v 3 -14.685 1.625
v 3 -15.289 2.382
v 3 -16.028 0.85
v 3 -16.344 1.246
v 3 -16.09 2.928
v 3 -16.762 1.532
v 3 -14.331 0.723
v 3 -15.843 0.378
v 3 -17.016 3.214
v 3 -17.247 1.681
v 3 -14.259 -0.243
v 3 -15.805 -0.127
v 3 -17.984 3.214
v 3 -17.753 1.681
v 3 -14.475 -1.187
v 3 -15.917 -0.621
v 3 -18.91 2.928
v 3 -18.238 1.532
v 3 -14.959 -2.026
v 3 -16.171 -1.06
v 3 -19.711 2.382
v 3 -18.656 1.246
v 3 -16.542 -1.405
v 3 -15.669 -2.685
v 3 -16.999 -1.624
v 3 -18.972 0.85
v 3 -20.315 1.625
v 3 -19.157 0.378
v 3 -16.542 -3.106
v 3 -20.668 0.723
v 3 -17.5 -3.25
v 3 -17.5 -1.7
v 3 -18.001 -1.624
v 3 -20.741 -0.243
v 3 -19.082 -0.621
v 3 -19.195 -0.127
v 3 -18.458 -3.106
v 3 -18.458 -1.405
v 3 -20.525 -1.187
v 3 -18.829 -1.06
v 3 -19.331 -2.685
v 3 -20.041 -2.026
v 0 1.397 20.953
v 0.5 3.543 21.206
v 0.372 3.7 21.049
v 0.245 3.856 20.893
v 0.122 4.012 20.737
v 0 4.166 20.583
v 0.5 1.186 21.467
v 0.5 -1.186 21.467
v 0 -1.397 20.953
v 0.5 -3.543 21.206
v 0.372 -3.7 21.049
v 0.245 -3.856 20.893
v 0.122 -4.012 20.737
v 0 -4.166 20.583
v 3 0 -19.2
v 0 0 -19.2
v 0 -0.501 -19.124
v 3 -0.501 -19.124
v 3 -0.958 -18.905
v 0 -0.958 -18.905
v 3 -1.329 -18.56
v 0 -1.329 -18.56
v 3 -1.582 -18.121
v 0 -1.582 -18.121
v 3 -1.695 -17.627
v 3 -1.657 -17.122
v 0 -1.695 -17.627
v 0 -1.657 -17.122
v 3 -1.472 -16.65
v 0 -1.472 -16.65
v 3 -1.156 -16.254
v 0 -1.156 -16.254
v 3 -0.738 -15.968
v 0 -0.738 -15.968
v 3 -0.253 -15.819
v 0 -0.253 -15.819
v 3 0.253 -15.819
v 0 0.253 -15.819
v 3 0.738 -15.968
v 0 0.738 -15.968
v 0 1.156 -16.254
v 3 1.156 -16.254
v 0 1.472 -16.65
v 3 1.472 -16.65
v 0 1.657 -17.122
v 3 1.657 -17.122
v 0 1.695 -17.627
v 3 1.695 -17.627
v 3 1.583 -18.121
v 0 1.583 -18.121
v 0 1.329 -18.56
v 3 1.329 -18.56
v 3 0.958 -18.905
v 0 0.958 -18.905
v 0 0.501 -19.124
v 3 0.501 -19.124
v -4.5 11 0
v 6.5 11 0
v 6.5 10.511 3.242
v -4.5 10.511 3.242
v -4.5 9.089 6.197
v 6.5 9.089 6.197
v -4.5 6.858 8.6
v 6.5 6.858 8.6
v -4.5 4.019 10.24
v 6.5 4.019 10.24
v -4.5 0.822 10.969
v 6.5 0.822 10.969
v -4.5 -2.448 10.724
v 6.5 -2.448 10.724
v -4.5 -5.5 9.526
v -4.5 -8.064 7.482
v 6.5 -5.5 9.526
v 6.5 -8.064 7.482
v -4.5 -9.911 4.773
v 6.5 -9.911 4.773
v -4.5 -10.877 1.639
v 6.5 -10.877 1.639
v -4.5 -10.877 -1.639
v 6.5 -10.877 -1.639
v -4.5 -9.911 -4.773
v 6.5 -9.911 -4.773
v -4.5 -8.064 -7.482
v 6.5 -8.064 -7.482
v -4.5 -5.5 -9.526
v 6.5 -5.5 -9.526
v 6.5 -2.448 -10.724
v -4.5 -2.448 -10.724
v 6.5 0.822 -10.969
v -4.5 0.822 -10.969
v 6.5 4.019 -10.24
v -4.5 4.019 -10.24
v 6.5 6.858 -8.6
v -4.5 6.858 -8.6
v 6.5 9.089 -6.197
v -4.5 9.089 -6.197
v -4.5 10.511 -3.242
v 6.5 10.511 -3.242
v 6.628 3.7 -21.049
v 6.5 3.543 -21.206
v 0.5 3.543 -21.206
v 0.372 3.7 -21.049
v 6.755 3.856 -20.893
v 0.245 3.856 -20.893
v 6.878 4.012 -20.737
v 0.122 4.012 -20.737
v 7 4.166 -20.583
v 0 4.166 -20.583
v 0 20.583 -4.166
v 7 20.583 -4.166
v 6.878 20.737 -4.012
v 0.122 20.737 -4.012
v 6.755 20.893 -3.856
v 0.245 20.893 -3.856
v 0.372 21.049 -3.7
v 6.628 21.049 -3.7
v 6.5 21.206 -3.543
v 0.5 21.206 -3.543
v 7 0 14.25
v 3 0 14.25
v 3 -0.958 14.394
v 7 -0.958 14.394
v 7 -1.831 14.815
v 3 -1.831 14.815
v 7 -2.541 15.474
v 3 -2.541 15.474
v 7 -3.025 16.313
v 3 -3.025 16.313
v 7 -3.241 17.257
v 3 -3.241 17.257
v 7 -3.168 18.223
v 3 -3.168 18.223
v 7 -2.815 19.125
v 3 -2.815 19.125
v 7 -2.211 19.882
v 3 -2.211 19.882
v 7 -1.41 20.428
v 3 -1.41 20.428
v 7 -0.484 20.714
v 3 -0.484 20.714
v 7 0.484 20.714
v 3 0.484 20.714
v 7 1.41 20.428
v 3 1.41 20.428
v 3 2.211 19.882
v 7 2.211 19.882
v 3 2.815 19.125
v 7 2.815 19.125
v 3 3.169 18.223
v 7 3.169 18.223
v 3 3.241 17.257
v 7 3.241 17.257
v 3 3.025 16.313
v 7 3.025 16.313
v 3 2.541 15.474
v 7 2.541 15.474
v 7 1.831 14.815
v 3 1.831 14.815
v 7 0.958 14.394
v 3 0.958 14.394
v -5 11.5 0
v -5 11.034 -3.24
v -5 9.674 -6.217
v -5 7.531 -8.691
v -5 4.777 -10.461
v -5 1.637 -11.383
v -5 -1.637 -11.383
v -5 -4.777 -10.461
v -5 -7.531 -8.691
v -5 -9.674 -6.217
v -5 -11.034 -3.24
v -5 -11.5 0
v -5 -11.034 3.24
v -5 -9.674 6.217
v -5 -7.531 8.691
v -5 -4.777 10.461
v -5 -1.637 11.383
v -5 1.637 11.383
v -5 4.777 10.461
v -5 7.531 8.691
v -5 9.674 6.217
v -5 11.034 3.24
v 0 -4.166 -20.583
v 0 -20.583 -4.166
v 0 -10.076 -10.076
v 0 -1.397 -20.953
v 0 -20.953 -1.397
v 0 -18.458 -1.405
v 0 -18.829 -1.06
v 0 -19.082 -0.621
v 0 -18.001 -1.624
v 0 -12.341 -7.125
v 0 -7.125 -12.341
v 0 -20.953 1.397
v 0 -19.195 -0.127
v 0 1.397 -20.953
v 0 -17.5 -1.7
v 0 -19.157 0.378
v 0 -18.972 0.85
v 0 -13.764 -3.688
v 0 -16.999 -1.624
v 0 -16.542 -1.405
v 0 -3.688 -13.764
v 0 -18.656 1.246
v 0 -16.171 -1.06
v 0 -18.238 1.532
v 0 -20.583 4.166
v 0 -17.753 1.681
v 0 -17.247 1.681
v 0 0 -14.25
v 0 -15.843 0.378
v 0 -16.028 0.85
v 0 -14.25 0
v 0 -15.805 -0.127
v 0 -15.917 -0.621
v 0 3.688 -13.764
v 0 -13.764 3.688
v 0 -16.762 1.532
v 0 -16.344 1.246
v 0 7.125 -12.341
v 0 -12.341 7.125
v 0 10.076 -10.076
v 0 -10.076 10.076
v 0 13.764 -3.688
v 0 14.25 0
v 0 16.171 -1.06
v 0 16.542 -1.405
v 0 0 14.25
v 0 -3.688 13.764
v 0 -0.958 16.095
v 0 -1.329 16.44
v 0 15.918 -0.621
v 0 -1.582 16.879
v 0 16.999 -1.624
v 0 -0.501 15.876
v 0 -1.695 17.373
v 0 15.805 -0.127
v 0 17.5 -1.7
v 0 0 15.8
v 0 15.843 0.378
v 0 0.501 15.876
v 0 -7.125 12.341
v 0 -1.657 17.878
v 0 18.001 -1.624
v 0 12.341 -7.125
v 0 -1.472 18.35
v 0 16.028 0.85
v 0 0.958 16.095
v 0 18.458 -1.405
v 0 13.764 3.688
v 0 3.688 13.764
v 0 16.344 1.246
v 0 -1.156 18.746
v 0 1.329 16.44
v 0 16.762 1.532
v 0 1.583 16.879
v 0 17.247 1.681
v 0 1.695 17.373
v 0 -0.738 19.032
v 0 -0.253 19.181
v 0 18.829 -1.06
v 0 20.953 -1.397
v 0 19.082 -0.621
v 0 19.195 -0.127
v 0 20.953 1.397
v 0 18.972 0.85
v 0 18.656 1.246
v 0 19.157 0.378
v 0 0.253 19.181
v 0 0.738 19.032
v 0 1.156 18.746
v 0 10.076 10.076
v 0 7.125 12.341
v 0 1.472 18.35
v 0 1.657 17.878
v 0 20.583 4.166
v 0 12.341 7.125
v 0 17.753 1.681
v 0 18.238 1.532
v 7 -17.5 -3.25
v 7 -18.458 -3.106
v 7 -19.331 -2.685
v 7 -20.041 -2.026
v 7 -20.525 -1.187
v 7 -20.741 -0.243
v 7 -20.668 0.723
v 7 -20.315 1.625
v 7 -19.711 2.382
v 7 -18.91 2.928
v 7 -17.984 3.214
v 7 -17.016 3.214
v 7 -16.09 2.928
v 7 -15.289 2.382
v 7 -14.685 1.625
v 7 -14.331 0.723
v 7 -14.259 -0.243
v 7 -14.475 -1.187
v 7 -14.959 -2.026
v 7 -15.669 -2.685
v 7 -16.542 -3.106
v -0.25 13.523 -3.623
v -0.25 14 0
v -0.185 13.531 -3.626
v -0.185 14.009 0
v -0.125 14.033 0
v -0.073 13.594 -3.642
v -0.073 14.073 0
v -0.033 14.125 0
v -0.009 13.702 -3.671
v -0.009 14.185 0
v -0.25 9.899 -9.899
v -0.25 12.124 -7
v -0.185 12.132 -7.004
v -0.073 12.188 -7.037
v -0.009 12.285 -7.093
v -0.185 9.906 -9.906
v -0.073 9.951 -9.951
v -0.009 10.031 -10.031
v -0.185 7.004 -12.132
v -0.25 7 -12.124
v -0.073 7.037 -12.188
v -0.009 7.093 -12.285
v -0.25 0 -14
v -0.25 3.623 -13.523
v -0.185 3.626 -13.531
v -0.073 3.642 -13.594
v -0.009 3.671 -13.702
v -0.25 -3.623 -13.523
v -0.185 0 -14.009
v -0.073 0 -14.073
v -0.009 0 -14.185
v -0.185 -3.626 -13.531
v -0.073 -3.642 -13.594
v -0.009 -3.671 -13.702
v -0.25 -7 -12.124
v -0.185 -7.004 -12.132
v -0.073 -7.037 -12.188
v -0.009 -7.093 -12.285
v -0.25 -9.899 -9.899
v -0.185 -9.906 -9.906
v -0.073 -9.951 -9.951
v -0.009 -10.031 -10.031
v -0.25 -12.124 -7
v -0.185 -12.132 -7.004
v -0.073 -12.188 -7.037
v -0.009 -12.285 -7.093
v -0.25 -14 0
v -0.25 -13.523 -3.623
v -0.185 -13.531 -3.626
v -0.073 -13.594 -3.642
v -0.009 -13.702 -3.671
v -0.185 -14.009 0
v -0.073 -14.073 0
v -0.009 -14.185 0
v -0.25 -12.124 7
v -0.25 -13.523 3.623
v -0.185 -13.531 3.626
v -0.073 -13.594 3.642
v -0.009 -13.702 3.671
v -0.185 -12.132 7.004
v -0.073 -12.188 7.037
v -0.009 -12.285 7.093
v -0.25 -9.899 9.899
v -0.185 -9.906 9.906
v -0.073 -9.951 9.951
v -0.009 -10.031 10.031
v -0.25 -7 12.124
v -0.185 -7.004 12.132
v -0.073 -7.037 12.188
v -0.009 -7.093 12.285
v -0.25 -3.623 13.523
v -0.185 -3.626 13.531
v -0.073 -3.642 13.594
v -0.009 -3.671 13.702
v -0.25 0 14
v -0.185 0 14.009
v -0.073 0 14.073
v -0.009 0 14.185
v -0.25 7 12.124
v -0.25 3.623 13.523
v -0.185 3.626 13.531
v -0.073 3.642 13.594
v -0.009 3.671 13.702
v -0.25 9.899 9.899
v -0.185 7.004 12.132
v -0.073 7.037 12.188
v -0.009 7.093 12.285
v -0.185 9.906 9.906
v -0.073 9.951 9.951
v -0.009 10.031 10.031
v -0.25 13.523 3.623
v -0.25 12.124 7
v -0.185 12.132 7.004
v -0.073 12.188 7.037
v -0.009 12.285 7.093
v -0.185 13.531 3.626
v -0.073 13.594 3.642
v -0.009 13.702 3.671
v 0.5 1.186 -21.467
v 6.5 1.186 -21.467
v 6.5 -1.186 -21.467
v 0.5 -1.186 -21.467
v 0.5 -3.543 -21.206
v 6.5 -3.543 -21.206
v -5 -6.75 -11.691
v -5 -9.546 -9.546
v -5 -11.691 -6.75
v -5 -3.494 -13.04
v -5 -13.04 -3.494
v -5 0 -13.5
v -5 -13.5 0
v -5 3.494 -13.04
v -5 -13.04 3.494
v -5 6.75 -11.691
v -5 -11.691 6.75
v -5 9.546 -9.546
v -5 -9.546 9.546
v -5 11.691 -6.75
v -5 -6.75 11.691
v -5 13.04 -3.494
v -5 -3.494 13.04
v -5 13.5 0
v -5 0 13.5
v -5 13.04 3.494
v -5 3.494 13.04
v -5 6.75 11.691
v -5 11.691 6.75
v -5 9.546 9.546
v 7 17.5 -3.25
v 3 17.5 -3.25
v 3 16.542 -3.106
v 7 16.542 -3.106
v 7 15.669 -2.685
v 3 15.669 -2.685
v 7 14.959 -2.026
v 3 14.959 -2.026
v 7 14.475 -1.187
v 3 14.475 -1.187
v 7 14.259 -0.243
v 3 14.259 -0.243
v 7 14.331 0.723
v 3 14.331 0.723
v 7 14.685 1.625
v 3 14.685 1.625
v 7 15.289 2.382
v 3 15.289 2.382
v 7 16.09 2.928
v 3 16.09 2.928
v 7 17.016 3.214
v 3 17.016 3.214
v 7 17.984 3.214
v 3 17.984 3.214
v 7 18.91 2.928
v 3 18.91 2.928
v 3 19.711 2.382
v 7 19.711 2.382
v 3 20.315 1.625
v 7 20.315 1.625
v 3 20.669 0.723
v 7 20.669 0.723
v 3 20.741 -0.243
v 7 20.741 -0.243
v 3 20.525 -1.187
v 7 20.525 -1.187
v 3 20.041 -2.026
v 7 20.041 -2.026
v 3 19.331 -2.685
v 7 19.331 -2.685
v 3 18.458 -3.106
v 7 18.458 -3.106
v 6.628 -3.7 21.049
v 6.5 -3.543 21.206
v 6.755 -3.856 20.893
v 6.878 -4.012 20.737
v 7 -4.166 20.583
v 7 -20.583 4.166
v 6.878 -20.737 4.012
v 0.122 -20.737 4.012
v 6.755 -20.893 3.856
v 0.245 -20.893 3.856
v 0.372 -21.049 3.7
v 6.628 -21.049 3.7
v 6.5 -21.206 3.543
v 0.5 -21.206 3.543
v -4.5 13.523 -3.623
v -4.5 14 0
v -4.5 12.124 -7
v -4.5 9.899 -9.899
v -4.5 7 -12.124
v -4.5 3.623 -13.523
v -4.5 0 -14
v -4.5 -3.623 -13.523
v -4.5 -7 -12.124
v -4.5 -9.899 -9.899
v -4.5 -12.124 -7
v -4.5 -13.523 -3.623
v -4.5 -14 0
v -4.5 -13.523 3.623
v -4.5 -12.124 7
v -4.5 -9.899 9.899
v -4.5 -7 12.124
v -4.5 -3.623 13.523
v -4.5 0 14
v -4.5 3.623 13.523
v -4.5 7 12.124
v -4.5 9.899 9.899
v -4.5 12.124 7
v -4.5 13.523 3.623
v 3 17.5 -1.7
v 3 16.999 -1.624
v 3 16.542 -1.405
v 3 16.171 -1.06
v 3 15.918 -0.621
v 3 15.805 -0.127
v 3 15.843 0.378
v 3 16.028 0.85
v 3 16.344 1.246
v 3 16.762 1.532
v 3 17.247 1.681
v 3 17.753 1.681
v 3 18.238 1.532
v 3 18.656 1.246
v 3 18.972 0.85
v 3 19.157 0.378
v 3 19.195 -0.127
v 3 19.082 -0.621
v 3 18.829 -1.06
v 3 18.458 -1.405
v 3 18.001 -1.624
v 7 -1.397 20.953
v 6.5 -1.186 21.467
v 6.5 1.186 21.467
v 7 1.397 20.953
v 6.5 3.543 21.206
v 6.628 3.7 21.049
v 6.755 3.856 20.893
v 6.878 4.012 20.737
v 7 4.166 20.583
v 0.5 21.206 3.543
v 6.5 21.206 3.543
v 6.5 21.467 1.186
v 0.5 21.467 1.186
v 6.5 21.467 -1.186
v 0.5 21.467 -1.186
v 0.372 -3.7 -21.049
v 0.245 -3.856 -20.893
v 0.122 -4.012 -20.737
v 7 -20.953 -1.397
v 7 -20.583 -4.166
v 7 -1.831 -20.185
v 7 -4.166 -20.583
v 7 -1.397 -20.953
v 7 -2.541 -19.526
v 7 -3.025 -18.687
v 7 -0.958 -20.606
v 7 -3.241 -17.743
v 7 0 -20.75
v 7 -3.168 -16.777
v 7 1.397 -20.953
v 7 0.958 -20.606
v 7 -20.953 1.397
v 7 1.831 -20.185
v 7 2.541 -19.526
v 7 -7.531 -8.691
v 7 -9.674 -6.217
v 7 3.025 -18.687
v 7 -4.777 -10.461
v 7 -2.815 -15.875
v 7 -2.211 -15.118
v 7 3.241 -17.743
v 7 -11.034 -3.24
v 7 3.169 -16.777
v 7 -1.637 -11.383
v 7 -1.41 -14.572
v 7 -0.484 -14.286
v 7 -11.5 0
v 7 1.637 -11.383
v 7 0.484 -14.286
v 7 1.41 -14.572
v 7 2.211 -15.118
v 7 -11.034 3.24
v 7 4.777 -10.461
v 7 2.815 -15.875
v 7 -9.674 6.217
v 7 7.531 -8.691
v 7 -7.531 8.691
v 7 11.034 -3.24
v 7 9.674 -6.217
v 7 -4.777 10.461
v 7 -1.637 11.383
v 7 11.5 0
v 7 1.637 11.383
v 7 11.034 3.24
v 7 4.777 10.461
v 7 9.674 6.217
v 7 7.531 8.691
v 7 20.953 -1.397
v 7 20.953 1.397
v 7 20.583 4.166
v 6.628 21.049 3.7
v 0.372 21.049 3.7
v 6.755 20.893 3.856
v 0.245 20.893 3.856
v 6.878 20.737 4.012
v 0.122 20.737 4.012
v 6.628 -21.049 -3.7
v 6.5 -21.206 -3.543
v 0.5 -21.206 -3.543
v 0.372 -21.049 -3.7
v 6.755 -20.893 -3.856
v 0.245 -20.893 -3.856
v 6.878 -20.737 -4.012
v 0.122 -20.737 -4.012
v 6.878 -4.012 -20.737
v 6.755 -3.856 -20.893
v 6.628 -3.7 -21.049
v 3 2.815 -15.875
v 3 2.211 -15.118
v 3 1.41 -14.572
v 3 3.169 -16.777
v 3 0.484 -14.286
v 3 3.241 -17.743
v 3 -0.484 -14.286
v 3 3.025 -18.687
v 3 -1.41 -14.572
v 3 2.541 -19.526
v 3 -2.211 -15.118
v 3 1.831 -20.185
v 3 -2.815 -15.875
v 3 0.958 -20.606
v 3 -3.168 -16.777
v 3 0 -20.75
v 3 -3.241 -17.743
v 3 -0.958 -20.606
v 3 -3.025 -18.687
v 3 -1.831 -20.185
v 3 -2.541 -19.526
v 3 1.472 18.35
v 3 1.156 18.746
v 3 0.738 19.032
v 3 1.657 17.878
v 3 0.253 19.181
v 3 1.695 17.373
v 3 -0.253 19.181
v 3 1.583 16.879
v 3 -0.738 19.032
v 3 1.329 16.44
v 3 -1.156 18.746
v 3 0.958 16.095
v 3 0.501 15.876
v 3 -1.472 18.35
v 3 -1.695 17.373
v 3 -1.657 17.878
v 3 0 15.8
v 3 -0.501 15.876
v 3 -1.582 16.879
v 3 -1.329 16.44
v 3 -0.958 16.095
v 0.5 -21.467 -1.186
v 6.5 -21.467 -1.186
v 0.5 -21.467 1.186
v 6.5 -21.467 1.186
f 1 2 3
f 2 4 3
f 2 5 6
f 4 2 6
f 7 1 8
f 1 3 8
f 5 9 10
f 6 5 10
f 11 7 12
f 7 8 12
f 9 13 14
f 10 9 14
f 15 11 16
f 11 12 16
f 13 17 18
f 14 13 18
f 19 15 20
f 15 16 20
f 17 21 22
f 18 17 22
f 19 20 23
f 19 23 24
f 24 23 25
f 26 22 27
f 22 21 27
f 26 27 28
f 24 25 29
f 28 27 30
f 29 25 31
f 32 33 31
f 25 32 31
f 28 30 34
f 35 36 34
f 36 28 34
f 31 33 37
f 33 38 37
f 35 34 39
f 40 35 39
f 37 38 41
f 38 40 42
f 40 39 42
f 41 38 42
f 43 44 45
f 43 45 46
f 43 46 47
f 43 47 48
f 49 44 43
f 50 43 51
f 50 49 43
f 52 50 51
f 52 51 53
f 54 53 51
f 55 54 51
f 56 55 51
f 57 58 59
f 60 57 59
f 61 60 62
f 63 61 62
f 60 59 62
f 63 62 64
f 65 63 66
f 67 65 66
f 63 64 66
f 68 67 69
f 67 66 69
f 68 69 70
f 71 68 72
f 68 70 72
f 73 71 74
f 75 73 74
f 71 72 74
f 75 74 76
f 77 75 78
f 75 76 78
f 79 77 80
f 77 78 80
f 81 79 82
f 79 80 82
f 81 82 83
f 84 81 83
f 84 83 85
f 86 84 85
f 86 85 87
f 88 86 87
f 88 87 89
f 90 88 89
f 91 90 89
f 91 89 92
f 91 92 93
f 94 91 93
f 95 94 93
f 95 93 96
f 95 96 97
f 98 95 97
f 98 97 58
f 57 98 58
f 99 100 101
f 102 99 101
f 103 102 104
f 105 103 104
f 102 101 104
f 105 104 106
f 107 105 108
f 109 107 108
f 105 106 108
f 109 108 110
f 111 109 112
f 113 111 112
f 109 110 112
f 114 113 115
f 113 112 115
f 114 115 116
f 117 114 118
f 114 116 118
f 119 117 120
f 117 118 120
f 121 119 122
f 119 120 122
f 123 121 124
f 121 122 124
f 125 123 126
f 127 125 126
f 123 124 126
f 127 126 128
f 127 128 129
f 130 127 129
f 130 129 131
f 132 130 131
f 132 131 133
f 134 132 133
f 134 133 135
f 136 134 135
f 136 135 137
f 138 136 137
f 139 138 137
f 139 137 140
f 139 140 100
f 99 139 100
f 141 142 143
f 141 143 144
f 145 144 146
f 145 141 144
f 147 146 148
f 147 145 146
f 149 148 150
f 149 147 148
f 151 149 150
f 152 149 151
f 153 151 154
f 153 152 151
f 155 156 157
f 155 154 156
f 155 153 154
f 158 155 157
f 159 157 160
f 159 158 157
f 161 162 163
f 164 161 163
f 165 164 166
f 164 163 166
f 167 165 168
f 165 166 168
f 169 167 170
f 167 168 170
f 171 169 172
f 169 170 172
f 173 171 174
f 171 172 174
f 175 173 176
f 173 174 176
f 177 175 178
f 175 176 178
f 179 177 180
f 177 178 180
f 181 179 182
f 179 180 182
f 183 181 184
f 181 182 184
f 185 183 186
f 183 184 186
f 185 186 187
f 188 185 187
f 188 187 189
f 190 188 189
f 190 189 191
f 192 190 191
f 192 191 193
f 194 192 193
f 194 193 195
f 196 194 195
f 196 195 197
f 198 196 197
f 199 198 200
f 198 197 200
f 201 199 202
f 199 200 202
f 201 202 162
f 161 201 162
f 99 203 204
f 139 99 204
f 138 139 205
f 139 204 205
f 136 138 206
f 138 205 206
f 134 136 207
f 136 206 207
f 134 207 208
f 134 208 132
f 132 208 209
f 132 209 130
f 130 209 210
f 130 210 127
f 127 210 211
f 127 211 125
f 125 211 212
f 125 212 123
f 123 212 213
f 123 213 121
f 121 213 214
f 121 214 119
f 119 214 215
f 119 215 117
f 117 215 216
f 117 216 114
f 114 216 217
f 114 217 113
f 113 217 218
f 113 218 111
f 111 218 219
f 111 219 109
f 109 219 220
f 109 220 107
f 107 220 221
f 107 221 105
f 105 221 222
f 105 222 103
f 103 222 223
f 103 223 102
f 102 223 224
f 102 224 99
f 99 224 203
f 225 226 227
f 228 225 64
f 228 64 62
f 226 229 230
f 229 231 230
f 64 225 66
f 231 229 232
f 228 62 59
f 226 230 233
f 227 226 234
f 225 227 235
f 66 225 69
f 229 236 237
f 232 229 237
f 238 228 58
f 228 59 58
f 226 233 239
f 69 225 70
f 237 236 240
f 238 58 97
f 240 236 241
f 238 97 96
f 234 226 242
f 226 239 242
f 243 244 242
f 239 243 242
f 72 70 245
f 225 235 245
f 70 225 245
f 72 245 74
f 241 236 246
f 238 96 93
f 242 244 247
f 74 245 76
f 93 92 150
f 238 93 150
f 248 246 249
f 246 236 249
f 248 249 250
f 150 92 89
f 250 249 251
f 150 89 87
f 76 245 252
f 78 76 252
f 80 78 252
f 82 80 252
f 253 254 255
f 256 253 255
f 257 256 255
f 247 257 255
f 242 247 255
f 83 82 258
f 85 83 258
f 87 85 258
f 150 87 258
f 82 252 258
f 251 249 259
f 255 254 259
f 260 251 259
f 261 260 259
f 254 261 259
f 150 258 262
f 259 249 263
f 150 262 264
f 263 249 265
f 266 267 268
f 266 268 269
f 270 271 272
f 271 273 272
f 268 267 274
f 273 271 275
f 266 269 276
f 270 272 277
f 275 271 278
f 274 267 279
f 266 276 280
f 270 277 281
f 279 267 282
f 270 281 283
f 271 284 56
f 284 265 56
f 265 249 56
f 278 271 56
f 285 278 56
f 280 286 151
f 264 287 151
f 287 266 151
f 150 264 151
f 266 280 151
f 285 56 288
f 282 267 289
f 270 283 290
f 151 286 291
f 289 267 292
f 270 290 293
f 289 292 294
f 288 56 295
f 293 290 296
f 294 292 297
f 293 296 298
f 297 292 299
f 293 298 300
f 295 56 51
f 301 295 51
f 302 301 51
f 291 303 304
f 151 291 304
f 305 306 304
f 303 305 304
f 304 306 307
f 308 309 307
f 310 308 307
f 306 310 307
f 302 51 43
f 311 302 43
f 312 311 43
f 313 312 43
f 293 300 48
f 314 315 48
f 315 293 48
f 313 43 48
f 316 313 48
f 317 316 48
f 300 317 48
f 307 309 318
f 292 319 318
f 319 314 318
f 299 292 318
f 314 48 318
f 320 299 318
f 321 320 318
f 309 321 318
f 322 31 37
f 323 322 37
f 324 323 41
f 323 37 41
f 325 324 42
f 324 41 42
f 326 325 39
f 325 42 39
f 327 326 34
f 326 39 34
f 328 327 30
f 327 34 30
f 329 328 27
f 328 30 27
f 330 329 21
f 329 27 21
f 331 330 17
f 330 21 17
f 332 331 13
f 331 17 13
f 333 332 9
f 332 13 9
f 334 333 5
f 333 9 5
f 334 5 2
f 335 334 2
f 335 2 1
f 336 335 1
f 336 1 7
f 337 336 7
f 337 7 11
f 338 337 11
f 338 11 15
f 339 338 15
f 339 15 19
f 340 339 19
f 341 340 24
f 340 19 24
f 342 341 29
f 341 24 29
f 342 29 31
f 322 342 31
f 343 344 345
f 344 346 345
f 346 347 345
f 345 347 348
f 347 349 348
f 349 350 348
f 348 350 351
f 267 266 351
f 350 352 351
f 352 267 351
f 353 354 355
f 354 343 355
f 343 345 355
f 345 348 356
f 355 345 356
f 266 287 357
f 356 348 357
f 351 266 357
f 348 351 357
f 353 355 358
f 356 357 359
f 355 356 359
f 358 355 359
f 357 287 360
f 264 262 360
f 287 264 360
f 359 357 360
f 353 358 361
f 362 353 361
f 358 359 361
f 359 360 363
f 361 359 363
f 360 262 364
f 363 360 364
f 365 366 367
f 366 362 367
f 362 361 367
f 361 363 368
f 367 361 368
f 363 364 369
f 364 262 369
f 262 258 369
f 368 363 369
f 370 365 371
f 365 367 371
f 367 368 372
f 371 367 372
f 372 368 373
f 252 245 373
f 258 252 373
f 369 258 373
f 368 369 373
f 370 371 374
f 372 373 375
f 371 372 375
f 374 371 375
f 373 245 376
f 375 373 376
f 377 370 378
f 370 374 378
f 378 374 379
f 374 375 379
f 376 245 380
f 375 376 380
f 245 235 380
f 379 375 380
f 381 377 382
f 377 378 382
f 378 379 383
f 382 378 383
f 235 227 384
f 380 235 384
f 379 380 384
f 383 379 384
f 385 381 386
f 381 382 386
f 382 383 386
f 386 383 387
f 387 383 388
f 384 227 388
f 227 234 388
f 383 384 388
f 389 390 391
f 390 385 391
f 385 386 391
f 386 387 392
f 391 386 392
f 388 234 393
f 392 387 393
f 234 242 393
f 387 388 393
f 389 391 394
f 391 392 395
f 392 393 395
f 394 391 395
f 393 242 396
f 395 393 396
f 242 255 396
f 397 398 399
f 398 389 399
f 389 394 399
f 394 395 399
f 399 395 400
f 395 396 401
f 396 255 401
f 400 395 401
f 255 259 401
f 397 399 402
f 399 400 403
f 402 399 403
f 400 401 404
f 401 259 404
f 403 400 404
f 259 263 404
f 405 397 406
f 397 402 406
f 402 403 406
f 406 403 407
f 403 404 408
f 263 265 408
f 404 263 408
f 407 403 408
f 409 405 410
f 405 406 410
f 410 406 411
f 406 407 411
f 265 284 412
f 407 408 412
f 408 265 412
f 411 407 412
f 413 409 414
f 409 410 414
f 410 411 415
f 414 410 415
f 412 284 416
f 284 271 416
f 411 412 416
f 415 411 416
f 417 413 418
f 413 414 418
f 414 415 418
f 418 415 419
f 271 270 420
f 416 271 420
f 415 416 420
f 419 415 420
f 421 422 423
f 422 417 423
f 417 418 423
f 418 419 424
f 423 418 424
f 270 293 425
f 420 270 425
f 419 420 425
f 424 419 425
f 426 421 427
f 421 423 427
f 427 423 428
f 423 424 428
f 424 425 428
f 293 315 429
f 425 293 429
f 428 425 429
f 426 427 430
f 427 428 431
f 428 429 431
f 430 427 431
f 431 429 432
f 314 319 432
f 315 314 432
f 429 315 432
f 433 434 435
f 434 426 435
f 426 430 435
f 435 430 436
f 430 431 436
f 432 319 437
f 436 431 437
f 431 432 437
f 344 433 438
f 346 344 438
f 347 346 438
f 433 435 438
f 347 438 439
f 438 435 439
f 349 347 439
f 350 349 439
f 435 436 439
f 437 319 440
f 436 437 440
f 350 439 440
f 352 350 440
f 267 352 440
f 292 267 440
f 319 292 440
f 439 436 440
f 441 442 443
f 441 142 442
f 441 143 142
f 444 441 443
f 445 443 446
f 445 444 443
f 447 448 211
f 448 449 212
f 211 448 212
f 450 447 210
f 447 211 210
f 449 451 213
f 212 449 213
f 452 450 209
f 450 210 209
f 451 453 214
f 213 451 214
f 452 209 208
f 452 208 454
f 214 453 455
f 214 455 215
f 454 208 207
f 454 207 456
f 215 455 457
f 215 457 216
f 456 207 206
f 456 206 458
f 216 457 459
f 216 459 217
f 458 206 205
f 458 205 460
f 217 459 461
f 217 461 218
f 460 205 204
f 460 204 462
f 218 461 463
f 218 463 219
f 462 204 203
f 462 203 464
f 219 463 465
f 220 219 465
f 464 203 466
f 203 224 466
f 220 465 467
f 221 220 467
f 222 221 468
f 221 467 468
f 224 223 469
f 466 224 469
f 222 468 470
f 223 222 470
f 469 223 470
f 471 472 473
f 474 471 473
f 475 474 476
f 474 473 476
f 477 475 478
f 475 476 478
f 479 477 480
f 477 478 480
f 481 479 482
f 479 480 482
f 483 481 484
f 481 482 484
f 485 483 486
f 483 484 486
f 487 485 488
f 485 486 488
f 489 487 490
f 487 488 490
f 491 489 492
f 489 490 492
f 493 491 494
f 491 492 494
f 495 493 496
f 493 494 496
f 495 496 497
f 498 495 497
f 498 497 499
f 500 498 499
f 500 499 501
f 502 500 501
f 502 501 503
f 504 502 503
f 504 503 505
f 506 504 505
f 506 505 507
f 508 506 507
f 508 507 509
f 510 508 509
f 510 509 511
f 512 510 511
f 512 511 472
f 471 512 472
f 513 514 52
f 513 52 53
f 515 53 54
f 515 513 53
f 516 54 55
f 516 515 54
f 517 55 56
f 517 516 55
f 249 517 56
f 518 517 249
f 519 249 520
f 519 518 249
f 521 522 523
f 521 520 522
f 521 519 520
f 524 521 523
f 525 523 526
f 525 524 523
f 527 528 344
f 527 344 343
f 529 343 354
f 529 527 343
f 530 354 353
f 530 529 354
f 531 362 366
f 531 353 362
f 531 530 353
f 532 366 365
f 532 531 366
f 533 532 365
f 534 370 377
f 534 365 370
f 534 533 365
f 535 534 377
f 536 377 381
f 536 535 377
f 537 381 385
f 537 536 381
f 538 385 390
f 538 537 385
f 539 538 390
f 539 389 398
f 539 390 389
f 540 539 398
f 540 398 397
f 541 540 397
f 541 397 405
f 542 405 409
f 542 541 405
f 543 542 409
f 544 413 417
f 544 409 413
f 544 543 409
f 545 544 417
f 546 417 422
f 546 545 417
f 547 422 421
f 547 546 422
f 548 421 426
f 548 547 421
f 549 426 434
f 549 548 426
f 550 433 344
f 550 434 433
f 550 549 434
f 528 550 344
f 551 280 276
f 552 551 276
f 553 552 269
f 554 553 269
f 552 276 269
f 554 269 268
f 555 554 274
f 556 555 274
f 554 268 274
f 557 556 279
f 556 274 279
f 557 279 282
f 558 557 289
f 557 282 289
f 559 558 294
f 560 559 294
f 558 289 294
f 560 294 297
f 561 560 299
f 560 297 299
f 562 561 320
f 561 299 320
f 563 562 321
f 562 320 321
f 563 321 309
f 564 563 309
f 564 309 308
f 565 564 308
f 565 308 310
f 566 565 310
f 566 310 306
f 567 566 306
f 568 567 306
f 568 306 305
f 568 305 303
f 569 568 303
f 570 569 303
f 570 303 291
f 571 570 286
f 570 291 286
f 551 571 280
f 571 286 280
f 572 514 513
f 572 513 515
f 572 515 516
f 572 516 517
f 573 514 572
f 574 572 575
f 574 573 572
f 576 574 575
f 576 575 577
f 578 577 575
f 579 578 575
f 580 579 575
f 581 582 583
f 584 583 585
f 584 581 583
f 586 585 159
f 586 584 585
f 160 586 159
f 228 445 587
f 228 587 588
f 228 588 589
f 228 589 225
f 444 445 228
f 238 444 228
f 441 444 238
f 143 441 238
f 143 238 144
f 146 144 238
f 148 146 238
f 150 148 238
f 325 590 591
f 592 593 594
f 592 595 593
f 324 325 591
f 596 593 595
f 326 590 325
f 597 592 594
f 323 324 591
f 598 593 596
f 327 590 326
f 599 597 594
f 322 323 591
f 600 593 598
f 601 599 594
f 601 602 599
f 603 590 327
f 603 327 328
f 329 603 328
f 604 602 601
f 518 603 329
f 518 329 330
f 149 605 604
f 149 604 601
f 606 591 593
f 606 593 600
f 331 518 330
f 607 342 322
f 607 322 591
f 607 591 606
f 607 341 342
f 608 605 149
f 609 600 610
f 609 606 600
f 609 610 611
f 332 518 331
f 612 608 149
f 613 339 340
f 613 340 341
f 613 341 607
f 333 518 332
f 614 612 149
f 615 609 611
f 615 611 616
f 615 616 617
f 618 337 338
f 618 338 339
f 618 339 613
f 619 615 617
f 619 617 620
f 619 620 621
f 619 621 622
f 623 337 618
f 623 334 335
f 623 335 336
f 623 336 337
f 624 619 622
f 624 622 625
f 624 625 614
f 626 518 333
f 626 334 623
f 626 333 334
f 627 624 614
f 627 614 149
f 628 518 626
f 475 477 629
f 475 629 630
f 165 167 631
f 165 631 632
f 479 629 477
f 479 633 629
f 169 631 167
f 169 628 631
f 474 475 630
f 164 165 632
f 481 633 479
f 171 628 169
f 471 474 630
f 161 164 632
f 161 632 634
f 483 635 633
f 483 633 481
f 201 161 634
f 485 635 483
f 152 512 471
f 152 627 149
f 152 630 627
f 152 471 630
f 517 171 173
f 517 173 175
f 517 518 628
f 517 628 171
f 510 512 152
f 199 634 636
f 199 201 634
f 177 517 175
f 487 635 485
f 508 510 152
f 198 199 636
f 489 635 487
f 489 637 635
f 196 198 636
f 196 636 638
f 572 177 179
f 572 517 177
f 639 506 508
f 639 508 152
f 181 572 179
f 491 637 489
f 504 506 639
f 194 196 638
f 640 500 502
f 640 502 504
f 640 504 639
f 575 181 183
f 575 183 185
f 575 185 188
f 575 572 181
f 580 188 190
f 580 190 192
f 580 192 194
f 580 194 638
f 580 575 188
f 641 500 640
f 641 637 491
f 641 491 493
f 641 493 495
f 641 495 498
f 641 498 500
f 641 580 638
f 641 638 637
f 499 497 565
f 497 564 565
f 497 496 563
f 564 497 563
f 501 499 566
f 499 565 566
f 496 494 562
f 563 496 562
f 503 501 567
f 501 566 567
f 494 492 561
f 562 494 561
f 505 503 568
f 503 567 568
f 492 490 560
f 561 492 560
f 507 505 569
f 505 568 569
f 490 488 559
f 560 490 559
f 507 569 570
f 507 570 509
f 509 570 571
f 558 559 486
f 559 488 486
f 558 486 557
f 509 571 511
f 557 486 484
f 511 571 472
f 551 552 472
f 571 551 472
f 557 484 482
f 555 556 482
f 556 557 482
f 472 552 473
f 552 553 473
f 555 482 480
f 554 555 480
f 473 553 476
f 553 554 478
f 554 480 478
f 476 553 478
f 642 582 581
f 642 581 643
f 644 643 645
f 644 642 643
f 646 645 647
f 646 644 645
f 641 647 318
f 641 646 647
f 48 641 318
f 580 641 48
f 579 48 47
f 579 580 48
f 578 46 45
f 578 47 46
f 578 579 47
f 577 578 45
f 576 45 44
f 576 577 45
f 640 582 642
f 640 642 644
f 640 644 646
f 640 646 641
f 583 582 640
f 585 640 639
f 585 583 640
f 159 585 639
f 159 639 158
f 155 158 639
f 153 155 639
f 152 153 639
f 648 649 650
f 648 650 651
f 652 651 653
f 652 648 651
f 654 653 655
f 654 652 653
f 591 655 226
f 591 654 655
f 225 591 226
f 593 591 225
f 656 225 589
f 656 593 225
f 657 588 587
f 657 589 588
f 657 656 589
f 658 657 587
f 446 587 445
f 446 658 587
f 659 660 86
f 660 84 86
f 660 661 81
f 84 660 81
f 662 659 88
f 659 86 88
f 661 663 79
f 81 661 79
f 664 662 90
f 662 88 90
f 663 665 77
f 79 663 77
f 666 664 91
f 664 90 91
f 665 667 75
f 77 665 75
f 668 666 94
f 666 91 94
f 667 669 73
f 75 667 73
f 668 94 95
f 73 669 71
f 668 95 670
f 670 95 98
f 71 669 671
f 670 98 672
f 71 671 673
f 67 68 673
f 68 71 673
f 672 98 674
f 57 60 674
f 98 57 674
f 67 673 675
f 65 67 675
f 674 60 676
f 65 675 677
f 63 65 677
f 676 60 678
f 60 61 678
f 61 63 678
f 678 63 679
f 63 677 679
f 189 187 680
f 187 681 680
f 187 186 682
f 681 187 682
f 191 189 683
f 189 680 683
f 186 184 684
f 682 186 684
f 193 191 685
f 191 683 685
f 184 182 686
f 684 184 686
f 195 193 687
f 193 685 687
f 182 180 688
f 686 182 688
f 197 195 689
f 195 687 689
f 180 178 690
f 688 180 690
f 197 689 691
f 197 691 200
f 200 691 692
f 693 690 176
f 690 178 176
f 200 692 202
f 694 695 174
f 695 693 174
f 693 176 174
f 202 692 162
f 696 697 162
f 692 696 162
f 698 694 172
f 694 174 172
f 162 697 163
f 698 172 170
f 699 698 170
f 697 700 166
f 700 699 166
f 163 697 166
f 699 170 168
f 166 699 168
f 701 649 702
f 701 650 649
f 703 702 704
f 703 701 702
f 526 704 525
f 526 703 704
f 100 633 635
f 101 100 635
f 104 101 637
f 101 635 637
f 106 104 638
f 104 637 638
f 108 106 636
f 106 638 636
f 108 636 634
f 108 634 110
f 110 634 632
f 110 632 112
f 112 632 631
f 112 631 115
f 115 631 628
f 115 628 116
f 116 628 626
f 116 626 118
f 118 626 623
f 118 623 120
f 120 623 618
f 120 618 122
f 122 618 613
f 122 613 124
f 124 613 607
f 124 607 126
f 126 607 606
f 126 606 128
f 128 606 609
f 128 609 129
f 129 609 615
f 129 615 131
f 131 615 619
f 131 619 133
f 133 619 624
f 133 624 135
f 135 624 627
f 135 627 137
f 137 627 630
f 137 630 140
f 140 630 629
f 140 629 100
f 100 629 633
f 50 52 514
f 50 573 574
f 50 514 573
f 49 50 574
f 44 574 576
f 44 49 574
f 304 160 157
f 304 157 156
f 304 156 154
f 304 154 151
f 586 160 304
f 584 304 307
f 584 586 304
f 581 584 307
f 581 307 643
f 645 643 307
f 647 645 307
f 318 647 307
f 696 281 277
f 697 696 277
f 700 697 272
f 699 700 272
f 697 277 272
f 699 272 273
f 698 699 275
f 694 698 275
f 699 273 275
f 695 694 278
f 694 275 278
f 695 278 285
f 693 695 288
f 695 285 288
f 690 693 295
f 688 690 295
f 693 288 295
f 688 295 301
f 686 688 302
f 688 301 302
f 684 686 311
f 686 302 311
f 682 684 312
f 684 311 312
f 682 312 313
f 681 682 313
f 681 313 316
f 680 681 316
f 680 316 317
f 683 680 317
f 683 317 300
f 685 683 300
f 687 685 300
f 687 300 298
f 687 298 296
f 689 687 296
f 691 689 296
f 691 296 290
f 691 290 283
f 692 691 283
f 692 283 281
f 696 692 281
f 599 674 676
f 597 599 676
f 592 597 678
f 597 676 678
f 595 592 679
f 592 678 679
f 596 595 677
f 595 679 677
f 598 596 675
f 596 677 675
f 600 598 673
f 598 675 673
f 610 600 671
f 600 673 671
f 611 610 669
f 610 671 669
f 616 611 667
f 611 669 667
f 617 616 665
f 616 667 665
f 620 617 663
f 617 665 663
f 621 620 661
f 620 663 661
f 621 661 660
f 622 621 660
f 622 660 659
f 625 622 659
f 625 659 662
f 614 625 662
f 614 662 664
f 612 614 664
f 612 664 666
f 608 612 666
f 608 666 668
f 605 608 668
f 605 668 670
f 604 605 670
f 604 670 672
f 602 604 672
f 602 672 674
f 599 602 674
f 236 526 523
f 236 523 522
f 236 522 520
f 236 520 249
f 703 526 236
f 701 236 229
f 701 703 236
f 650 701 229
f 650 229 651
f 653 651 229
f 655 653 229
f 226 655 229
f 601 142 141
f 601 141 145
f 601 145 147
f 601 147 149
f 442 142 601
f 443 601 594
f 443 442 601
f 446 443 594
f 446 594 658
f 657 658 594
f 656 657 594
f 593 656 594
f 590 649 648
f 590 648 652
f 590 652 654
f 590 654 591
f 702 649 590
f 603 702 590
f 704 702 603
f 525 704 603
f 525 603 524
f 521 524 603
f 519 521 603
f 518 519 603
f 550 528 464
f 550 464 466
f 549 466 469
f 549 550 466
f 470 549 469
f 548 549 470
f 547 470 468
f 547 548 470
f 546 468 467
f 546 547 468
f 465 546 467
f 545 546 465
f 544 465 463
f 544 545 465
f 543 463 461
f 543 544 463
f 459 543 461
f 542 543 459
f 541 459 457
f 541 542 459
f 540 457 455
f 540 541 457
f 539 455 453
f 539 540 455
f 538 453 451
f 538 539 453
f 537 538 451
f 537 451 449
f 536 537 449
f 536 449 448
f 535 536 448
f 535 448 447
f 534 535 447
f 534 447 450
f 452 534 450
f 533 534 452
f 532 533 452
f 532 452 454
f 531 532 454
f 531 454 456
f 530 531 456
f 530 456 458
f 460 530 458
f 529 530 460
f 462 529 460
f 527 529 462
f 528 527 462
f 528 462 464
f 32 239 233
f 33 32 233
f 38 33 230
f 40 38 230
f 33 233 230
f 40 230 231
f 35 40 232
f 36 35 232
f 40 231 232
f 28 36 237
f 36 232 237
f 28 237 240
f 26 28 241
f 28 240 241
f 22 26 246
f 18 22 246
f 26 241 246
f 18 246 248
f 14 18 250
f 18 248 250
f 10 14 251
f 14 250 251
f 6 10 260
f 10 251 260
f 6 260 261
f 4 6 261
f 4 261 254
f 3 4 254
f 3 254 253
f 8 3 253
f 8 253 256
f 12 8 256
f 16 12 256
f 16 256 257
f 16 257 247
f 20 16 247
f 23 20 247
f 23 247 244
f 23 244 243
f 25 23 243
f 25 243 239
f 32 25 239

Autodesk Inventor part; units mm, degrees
sketch "Sketch_1" plane through (0, 0, 0) normal (0, 0, 1) x (1, 0, 0)
  line L0 (50, 0) -> (-50, 0)
  line L1 (-5, 11.5) -> (-4.5, 11)
  line L2 (-4.5, 11) -> (6.5, 11)
  line L3 (6.5, 11) -> (7, 11.5)
  line L4 (7, 11.5) -> (7, 21)
  line L5 (7, 21) -> (6.5, 21.5)
  line L6 (6.5, 21.5) -> (0.5, 21.5)
  line L7 (0.5, 21.5) -> (0, 21)
  line L8 (0, 21) -> (0, 14.25)
  arc A0 (-0.25, 14) -> (0, 14.25) centre (-0.25, 14.25) ccw
  line L9 (-0.25, 14) -> (-4.5, 14)
  line L10 (-4.5, 14) -> (-5, 13.5)
  line L11 (-5, 13.5) -> (-5, 11.5)
revolve "Revolution1" add sketch "Sketch_1" angle 360 about axis through (50, 0, 0) along (1, 0, 0)
sketch "Sketch_2" plane through (7, 0, 0) normal (1, 0, 0) x (0, 0, -1)
  line L0 (-49.4975, 0) -> (0, -49.4975)
  line L1 (0, -49.4975) -> (49.4975, 0)
  line L2 (49.4975, 0) -> (0, 49.4975)
  line L3 (0, 49.4975) -> (-49.4975, 0)
  line L4 (-24.7487, 0) -> (0, -24.7487)
  line L5 (0, -24.7487) -> (24.7487, 0)
  line L6 (24.7487, 0) -> (0, 24.7487)
  line L7 (0, 24.7487) -> (-24.7487, 0)
extrude "Extrusion1" cut sketch "Sketch_2" against normal blind 7
sketch "Sketch3" plane through (7, 0, 0) normal (1, 0, 0) x (0, 0, -1)
  point P0 (0, 17.5)
hole "Hole1" at (7, 17.5, 0) direction (-1, 0, 0) diameter 3.4 depth 7 counterbore diameter 6.5 counterbore depth 4
pattern_linear "Rectangular Pattern1" count 2 spacing 24.7487 along (0, -0.7071, 0.7071) count 2 spacing 24.7487 along (0, -0.7071, -0.7071) of "Hole1"
ref_plane "ff_1_XY" through (0, 0, 0) normal (1, 0, 0) x (0, 0, -1)
ref_plane "ff_1_YZ" through (0, 0, 0) normal (0, 0, -1) x (0, 1, 0)
ref_plane "ff_1_ZX" through (0, 0, 0) normal (0, 1, 0) x (1, 0, 0)
ref_plane "ff_2x_XY" through (1, 0, 0) normal (1, 0, 0) x (0, 0, -1)
ref_plane "ff_2x_YZ" through (1, 0, 0) normal (0, 0, -1) x (0, 1, 0)
ref_plane "ff_2x_ZX" through (1, 0, 0) normal (0, 1, 0) x (1, 0, 0)
properties part number "FF 10Part1"
